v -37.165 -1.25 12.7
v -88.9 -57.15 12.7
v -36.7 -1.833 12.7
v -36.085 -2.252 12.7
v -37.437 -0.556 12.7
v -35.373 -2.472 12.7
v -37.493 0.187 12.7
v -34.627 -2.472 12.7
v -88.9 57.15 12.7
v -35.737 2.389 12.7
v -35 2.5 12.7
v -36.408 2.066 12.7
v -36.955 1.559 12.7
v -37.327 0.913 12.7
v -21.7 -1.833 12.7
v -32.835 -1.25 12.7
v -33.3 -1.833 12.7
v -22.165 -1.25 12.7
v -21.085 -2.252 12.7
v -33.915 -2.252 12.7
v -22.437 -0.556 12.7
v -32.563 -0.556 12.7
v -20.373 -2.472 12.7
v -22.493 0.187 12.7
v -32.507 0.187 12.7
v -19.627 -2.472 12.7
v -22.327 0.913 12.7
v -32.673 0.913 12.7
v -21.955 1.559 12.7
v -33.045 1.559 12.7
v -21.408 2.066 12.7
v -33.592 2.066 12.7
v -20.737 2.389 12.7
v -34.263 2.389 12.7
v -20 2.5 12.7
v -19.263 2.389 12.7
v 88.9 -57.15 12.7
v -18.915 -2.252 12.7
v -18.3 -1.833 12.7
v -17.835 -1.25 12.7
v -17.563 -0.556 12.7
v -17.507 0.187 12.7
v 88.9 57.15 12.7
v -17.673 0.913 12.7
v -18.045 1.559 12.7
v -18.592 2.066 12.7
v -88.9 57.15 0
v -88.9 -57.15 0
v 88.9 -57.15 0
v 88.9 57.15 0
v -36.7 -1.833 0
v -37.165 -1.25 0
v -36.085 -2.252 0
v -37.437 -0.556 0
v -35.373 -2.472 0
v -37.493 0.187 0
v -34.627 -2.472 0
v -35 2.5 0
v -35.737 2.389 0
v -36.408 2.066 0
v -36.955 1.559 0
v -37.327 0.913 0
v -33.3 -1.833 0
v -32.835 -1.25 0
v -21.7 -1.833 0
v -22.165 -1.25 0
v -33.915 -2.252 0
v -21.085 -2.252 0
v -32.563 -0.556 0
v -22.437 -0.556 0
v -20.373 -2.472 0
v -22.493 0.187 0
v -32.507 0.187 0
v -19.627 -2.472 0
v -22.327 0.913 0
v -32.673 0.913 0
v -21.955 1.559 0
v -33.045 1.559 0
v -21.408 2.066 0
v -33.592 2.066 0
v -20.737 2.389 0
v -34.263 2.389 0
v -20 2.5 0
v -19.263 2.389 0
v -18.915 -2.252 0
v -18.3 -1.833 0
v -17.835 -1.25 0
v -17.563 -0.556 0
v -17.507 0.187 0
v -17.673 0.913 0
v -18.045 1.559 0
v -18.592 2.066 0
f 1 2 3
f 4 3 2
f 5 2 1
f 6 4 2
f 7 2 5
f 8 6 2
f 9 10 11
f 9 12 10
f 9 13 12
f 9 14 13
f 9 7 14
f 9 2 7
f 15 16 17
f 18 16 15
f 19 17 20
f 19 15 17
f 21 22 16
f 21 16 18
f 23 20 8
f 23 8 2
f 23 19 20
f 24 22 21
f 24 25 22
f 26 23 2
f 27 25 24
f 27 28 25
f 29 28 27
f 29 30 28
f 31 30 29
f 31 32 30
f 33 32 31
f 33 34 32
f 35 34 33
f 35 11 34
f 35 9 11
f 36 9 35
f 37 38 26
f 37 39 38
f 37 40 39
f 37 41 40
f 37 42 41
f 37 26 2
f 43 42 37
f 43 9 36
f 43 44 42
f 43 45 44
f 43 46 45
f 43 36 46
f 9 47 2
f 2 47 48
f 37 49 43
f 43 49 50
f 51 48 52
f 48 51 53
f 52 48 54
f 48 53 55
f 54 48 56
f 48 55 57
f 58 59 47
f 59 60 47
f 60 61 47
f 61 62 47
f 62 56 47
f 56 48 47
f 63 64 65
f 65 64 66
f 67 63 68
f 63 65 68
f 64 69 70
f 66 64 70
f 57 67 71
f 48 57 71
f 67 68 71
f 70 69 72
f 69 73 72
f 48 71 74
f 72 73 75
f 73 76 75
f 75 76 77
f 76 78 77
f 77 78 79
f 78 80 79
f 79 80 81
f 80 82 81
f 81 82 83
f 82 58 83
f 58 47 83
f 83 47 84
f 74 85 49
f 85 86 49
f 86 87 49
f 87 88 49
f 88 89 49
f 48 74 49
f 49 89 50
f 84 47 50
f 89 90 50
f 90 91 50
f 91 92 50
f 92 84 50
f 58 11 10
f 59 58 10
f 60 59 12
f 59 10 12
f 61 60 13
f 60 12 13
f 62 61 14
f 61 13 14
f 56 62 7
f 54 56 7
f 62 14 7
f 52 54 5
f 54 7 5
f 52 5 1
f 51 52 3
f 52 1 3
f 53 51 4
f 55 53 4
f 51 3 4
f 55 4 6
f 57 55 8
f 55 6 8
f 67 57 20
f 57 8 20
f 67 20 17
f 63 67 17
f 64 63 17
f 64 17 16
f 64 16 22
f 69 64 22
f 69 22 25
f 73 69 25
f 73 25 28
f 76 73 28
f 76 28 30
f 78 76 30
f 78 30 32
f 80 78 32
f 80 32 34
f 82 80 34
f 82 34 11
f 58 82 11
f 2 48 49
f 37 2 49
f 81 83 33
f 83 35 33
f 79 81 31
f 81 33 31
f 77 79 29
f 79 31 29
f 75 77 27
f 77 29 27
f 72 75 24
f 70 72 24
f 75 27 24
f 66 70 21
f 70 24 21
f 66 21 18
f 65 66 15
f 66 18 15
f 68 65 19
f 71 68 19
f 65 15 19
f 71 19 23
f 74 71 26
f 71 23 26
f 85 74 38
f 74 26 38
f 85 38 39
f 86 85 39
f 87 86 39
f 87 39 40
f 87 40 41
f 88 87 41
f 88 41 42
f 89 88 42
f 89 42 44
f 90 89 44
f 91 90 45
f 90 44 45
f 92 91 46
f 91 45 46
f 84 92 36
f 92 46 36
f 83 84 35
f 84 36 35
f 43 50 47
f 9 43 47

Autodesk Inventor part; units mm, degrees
ref_plane "YZ Plane" through (0, 0, 0) normal (1, 0, 0) x (0, 1, 0)
ref_plane "XZ Plane" through (0, 0, 0) normal (0, 1, 0) x (-1, 0, 0)
ref_plane "XY Plane" through (0, 0, 0) normal (0, 0, 1) x (1, 0, 0)
sketch "Sketch1" plane through (0, 0, 0) normal (0, 0, 1) x (1, 0, 0)
  line L0 (-88.9, -57.15) -> (88.9, -57.15)
  line L1 (88.9, -57.15) -> (88.9, 57.15)
  line L2 (88.9, 57.15) -> (-88.9, 57.15)
  line L3 (-88.9, 57.15) -> (-88.9, -57.15)
  line L4 (-40, -6.35) -> (40, -6.35)
  line L5 (40, -6.35) -> (40, 6.35)
  line L6 (40, 6.35) -> (-40, 6.35)
  line L7 (-40, 6.35) -> (-40, -6.35)
  point P0 (-35, 0)
  point P1 (-20, 0)
  dimension "d0" = 177.8
  dimension "d1" = 114.3
  dimension "d2" = 80
  dimension "d3" = 12.7
extrude "Extrusion1" add sketch "Sketch1" along normal blind 12.7 contours L3 L2 L1 L0 | L7 L6 L5 L4
hole "Hole1" at (-35, 0, 0) at (-20, 0, 0) direction (0, 0, 1) diameter 5 end through all
properties part number "LoadCellLowerSide"
